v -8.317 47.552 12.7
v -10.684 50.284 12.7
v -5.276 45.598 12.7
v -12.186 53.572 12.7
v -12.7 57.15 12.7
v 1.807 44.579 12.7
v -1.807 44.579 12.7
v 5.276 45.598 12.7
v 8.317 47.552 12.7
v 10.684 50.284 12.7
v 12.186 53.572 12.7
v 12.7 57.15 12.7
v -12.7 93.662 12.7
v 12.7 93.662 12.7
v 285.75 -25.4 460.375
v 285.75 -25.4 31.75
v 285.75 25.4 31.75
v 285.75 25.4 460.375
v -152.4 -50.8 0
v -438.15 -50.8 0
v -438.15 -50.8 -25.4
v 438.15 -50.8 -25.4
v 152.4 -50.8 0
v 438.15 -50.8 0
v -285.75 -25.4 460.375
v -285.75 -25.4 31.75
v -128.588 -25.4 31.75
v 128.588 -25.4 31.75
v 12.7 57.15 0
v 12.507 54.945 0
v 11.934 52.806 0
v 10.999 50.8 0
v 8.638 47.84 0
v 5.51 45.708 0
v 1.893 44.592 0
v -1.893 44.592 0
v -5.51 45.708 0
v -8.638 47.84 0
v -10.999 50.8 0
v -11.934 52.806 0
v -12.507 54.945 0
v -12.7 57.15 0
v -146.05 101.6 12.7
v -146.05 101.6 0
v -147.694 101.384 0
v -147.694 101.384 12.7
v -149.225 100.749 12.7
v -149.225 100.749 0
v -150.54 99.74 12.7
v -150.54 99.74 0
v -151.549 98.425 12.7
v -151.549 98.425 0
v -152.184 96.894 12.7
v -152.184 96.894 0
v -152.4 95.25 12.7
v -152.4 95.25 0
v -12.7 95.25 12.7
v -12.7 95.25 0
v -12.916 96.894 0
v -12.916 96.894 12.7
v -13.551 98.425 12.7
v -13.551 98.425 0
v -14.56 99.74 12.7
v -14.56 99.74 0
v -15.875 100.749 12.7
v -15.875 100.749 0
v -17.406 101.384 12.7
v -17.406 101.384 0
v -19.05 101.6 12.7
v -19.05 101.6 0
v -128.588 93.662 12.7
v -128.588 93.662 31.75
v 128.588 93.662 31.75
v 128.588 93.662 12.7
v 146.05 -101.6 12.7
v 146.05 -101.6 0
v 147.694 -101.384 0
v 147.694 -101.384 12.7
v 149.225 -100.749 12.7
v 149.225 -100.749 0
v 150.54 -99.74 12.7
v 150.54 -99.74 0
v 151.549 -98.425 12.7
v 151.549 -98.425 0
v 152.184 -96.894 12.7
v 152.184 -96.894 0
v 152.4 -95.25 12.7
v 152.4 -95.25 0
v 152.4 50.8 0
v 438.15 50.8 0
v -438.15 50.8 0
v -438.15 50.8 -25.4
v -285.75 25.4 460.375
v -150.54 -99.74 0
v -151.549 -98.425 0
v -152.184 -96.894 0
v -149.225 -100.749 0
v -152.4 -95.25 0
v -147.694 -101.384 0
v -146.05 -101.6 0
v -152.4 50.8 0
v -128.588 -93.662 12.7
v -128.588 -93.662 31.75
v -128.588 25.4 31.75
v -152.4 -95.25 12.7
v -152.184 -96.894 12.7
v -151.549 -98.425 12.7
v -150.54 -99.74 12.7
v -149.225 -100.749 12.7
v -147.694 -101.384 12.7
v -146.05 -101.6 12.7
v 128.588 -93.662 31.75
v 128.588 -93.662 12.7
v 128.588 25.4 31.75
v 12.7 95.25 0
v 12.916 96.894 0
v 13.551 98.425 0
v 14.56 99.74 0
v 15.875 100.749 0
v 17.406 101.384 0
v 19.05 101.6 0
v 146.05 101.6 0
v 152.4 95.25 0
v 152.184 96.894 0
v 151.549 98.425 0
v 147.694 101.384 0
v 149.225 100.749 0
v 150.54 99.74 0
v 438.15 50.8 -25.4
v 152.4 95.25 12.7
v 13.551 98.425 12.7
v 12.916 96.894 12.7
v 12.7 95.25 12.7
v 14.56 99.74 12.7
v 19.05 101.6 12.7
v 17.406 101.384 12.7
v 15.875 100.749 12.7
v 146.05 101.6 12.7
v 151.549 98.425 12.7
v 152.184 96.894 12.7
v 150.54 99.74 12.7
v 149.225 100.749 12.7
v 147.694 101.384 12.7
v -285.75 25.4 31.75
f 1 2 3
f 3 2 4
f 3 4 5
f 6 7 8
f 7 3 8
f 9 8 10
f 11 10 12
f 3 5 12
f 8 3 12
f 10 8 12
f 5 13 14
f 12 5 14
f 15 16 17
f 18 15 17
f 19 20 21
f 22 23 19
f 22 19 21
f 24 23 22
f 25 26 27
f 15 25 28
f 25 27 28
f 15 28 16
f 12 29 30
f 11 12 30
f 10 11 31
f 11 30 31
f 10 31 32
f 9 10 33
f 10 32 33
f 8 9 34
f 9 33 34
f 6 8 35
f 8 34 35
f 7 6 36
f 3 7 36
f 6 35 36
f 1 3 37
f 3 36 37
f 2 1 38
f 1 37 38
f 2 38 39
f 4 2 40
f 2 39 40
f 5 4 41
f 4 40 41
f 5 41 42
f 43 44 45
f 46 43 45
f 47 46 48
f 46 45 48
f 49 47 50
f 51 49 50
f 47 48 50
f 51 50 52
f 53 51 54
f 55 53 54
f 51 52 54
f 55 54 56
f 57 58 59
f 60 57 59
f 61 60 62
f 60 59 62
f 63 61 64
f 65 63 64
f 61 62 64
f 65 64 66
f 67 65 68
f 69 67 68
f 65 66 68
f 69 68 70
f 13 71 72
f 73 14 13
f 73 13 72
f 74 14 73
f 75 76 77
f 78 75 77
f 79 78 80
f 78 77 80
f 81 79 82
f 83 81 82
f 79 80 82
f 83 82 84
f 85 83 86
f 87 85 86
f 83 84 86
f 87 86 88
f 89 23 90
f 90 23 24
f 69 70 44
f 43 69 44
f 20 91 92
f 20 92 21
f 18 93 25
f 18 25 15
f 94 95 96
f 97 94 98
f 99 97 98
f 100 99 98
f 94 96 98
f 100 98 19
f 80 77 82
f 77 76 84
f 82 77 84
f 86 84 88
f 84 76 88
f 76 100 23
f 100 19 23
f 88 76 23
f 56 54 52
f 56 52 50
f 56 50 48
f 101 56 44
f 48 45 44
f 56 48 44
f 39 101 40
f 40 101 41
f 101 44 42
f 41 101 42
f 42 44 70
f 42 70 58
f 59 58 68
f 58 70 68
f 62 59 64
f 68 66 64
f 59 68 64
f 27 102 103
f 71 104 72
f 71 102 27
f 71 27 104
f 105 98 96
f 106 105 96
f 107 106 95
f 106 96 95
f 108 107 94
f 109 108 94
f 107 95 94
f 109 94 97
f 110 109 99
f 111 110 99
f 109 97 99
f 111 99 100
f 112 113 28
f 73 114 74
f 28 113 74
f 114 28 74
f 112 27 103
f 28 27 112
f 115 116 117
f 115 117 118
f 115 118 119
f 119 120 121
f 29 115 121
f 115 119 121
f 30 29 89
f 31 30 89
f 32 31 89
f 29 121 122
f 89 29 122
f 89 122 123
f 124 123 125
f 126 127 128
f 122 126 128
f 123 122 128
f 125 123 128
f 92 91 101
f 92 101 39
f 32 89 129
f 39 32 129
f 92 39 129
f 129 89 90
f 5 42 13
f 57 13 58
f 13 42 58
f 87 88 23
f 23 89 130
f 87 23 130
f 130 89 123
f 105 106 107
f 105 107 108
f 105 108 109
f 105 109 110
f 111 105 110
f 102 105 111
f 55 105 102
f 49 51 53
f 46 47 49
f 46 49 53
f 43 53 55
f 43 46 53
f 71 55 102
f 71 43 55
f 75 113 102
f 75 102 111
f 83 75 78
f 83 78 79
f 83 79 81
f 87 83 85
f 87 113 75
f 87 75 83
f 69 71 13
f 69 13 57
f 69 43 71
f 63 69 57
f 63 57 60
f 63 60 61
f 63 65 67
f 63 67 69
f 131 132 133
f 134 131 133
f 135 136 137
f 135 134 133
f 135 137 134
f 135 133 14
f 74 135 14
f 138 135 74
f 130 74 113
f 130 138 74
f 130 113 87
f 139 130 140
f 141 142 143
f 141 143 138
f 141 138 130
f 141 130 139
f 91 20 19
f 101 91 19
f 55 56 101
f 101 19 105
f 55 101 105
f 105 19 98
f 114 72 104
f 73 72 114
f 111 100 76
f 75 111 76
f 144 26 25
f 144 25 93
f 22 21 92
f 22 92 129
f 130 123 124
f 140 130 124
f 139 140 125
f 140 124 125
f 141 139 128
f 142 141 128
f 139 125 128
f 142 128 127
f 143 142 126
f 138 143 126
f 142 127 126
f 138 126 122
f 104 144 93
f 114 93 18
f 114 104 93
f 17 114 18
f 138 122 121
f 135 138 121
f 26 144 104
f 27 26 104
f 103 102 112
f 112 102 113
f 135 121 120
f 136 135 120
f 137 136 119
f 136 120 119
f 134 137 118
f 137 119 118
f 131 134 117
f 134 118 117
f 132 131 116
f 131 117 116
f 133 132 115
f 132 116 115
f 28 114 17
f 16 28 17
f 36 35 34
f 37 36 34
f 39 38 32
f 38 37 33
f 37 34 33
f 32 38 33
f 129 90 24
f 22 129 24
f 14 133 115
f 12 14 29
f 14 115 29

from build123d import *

# Parameters (mm, degrees)
F1_DEPTH = 12.7
F2_W     = 876.3
F2_H     = 101.6
F3_DEPTH = 25.4
F4_W     = 257.175
F4_H     = 187.325
F5_DEPTH = 19.05
F6_W     = 571.5
F6_H     = 50.8
F7_DEPTH = 428.625


with BuildPart() as f1:
    # F0 (on Top) → F1 (new body)
    with BuildSketch(Plane.XY):
        with BuildLine():
            Line((-146.05, -101.6), (146.05, -101.6))
            ThreePointArc((146.05, -101.6), (150.540128, -99.740128), (152.4, -95.25))
            Line((152.4, -95.25), (152.4, 95.25))
            ThreePointArc((152.4, 95.25), (150.540128, 99.740128), (146.05, 101.6))
            Line((146.05, 101.6), (19.05, 101.6))
            ThreePointArc((19.05, 101.6), (14.559872, 99.740128), (12.7, 95.25))
            Line((12.7, 95.25), (12.7, 57.15))
            ThreePointArc((12.7, 57.15), (0, 44.45), (-12.7, 57.15))
            Line((-12.7, 57.15), (-12.7, 95.25))
            ThreePointArc((-12.7, 95.25), (-14.559872, 99.740128), (-19.05, 101.6))
            Line((-19.05, 101.6), (-146.05, 101.6))
            ThreePointArc((-146.05, 101.6), (-150.540128, 99.740128), (-152.4, 95.25))
            Line((-152.4, 95.25), (-152.4, -95.25))
            ThreePointArc((-152.4, -95.25), (-150.540128, -99.740128), (-146.05, -101.6))
        make_face()
    extrude(amount=F1_DEPTH)

    # F2 (on face) → F3 (join)
    with BuildSketch(Plane(origin=(0, 0, 0), x_dir=(1, 0, 0), z_dir=(0, 0, -1))):
        Rectangle(F2_W, F2_H)
    extrude(amount=F3_DEPTH)

    # F4 (on face) → F5 (join)
    with BuildSketch(Plane.XY.offset(12.7)):
        Rectangle(F4_W, F4_H)
    extrude(amount=F5_DEPTH)

    # F6 (on face) → F7 (join)
    with BuildSketch(Plane.XY.offset(31.75)):
        Rectangle(F6_W, F6_H)
    extrude(amount=F7_DEPTH)


solid = f1.part
